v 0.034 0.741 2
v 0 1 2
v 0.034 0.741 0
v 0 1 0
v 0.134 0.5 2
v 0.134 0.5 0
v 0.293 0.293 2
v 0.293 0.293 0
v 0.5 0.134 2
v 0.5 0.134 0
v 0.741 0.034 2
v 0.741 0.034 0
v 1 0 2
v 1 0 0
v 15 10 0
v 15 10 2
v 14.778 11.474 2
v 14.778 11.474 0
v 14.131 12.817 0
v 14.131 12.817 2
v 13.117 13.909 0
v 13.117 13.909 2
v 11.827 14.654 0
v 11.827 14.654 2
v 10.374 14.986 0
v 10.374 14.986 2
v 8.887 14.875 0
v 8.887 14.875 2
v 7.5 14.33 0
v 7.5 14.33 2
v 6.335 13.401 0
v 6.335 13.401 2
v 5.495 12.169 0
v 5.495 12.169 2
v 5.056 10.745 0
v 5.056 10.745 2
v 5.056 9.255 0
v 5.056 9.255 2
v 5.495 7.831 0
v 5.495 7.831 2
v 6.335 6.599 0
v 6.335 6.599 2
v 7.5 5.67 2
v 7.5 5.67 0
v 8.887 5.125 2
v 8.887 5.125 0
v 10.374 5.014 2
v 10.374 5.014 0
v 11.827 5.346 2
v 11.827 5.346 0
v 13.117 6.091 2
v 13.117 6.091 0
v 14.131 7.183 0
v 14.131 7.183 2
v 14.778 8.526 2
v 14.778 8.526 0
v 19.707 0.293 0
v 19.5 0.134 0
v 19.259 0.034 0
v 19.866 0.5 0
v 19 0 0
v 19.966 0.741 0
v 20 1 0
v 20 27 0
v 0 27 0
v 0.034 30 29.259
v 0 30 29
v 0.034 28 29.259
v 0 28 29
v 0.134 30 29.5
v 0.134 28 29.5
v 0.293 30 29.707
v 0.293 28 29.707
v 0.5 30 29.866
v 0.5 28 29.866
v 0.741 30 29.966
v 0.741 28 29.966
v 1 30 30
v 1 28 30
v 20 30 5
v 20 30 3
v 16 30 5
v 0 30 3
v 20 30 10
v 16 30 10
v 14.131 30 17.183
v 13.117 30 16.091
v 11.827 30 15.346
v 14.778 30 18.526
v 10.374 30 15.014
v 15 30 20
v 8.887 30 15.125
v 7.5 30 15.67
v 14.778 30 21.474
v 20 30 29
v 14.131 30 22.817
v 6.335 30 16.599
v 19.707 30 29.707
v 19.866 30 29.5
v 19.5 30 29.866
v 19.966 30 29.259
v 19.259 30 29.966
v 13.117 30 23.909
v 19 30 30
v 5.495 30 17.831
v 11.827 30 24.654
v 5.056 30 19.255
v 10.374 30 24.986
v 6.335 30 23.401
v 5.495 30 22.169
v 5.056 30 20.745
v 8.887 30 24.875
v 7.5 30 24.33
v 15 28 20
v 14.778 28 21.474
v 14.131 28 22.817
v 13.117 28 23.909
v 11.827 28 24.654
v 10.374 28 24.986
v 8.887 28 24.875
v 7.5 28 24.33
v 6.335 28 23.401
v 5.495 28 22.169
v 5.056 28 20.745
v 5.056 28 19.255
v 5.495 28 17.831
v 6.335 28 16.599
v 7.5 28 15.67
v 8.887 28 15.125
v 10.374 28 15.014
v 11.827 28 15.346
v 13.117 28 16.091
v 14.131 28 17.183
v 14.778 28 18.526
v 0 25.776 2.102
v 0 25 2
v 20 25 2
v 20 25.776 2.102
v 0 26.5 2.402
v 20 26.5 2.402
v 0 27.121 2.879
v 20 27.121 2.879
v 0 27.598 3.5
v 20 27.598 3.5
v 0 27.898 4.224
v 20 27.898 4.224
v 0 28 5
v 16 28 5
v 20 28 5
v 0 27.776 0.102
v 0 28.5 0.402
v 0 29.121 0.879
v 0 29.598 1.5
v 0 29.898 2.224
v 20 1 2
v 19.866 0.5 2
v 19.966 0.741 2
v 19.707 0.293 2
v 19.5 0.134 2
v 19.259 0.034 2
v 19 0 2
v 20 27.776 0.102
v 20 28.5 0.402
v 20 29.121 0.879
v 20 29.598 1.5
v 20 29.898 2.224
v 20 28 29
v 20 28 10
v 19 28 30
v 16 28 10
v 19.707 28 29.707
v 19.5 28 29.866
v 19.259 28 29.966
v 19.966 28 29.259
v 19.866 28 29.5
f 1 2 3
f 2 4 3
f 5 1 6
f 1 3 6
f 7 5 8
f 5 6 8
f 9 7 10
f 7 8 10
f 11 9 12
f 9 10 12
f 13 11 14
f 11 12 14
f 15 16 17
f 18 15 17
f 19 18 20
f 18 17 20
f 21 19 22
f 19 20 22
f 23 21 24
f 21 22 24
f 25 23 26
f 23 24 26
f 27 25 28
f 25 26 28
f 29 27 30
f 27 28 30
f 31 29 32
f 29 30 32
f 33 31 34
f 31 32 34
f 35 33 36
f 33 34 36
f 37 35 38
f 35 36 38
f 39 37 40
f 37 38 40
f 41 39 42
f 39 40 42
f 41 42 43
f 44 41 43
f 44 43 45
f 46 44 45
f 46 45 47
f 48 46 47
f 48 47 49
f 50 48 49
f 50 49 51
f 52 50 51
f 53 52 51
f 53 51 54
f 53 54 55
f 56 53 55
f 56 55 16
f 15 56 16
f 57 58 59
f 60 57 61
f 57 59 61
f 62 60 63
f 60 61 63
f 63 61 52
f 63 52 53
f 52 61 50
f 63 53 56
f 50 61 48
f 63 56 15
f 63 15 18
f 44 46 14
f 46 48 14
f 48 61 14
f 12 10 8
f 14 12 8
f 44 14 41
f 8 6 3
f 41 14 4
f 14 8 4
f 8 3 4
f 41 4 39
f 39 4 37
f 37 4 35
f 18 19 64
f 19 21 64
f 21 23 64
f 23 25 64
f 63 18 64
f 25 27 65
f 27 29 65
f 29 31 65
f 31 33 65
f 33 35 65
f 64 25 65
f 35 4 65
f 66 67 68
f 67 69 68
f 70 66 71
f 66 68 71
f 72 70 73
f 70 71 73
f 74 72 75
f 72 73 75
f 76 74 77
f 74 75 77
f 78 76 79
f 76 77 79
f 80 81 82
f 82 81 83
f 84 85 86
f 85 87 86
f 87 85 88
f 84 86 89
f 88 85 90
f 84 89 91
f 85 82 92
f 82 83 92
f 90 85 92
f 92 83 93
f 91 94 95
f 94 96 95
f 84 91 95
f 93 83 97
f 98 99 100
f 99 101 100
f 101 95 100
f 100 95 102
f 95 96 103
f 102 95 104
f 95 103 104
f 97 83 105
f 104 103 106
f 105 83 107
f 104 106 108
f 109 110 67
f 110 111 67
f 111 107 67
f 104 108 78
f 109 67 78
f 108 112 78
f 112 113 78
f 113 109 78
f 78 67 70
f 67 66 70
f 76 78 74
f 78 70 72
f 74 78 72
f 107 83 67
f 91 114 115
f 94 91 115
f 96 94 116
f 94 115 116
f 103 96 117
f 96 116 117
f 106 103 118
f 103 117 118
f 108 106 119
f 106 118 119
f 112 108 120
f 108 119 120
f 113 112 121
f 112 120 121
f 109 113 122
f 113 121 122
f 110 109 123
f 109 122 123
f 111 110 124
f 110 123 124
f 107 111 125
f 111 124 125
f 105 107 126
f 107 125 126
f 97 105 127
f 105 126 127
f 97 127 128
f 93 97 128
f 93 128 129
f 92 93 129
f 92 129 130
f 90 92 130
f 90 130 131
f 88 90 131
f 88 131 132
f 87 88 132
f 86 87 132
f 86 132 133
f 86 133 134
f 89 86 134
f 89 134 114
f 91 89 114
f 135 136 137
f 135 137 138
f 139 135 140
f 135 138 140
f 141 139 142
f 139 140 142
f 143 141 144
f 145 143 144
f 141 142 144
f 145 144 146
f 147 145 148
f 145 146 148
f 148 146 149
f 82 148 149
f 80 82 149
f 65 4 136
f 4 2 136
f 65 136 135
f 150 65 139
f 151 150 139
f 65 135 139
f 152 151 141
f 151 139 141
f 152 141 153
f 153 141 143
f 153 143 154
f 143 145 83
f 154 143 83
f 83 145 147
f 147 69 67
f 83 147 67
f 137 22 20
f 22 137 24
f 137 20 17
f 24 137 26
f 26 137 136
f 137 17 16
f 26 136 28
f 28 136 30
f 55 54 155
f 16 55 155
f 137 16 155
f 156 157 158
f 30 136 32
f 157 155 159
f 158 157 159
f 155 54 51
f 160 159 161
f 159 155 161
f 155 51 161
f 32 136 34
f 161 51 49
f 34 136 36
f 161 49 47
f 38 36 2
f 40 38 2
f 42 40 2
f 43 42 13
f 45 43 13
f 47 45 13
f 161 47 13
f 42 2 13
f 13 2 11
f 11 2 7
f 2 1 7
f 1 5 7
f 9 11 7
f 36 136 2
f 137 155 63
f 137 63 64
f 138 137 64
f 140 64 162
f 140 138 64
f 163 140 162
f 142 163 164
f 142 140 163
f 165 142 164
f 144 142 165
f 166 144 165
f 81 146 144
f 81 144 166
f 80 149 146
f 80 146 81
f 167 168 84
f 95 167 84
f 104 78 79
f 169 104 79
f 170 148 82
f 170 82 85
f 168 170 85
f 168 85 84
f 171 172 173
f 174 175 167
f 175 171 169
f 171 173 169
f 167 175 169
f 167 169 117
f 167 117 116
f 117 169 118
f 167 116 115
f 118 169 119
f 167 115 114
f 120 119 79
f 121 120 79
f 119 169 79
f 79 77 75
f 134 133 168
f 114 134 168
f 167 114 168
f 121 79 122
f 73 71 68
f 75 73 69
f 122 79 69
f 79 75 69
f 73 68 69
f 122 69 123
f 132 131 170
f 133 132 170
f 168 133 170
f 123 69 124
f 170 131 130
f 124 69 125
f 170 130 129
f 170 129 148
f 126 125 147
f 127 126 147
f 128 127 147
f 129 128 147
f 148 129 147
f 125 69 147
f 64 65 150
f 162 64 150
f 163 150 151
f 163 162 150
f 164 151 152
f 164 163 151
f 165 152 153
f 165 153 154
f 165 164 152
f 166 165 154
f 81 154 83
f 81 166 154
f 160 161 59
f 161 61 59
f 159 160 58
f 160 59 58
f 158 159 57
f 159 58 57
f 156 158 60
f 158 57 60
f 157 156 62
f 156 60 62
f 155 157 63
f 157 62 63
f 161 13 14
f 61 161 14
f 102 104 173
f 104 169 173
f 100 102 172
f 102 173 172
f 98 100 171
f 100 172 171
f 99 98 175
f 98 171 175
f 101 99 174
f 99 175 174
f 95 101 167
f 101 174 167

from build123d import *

# Parameters (mm, degrees)
F1_DEPTH = 20
F2_R     = 5
F2_W     = 4
F2_H     = 5
F3_DEPTH = 2.001
F4_R     = 5
F5_DEPTH = 2.001
F6_R     = 3
F7_R     = 1


with BuildPart() as f1:
    # F0 (on Right) → F1 (new body)
    with BuildSketch(Plane.YZ):
        Polygon((0, 2), (0, 0), (30, 0), (30, 30), (28, 30), (28, 2), align=None)
    extrude(amount=F1_DEPTH)

    # F2 (on face) → F3 (cut, through all)
    with BuildSketch(Plane.XZ.offset(-28)):
        with Locations((10, 20)):
            Circle(F2_R)
        with Locations((18, 7.5)):
            Rectangle(F2_W, F2_H)
    extrude(amount=-F3_DEPTH, mode=Mode.SUBTRACT)

    # F4 (on face) → F5 (cut, through all)
    with BuildSketch(Plane.XY.offset(2)):
        with Locations((10, 10)):
            Circle(F4_R)
    extrude(amount=-F5_DEPTH, mode=Mode.SUBTRACT)

    # F6
    f6_edges = [f1.edges().sort_by_distance(p)[0] for p in [
        (10, 28, 2),
        (10, 30, 0),
    ]]
    fillet(f6_edges, radius=F6_R)

    # F7
    f7_edges = [f1.edges().sort_by_distance(p)[0] for p in [
        (0, 0, 1),
        (20, 0, 1),
        (20, 29, 30),
        (0, 29, 30),
    ]]
    fillet(f7_edges, radius=F7_R)


solid = f1.part
